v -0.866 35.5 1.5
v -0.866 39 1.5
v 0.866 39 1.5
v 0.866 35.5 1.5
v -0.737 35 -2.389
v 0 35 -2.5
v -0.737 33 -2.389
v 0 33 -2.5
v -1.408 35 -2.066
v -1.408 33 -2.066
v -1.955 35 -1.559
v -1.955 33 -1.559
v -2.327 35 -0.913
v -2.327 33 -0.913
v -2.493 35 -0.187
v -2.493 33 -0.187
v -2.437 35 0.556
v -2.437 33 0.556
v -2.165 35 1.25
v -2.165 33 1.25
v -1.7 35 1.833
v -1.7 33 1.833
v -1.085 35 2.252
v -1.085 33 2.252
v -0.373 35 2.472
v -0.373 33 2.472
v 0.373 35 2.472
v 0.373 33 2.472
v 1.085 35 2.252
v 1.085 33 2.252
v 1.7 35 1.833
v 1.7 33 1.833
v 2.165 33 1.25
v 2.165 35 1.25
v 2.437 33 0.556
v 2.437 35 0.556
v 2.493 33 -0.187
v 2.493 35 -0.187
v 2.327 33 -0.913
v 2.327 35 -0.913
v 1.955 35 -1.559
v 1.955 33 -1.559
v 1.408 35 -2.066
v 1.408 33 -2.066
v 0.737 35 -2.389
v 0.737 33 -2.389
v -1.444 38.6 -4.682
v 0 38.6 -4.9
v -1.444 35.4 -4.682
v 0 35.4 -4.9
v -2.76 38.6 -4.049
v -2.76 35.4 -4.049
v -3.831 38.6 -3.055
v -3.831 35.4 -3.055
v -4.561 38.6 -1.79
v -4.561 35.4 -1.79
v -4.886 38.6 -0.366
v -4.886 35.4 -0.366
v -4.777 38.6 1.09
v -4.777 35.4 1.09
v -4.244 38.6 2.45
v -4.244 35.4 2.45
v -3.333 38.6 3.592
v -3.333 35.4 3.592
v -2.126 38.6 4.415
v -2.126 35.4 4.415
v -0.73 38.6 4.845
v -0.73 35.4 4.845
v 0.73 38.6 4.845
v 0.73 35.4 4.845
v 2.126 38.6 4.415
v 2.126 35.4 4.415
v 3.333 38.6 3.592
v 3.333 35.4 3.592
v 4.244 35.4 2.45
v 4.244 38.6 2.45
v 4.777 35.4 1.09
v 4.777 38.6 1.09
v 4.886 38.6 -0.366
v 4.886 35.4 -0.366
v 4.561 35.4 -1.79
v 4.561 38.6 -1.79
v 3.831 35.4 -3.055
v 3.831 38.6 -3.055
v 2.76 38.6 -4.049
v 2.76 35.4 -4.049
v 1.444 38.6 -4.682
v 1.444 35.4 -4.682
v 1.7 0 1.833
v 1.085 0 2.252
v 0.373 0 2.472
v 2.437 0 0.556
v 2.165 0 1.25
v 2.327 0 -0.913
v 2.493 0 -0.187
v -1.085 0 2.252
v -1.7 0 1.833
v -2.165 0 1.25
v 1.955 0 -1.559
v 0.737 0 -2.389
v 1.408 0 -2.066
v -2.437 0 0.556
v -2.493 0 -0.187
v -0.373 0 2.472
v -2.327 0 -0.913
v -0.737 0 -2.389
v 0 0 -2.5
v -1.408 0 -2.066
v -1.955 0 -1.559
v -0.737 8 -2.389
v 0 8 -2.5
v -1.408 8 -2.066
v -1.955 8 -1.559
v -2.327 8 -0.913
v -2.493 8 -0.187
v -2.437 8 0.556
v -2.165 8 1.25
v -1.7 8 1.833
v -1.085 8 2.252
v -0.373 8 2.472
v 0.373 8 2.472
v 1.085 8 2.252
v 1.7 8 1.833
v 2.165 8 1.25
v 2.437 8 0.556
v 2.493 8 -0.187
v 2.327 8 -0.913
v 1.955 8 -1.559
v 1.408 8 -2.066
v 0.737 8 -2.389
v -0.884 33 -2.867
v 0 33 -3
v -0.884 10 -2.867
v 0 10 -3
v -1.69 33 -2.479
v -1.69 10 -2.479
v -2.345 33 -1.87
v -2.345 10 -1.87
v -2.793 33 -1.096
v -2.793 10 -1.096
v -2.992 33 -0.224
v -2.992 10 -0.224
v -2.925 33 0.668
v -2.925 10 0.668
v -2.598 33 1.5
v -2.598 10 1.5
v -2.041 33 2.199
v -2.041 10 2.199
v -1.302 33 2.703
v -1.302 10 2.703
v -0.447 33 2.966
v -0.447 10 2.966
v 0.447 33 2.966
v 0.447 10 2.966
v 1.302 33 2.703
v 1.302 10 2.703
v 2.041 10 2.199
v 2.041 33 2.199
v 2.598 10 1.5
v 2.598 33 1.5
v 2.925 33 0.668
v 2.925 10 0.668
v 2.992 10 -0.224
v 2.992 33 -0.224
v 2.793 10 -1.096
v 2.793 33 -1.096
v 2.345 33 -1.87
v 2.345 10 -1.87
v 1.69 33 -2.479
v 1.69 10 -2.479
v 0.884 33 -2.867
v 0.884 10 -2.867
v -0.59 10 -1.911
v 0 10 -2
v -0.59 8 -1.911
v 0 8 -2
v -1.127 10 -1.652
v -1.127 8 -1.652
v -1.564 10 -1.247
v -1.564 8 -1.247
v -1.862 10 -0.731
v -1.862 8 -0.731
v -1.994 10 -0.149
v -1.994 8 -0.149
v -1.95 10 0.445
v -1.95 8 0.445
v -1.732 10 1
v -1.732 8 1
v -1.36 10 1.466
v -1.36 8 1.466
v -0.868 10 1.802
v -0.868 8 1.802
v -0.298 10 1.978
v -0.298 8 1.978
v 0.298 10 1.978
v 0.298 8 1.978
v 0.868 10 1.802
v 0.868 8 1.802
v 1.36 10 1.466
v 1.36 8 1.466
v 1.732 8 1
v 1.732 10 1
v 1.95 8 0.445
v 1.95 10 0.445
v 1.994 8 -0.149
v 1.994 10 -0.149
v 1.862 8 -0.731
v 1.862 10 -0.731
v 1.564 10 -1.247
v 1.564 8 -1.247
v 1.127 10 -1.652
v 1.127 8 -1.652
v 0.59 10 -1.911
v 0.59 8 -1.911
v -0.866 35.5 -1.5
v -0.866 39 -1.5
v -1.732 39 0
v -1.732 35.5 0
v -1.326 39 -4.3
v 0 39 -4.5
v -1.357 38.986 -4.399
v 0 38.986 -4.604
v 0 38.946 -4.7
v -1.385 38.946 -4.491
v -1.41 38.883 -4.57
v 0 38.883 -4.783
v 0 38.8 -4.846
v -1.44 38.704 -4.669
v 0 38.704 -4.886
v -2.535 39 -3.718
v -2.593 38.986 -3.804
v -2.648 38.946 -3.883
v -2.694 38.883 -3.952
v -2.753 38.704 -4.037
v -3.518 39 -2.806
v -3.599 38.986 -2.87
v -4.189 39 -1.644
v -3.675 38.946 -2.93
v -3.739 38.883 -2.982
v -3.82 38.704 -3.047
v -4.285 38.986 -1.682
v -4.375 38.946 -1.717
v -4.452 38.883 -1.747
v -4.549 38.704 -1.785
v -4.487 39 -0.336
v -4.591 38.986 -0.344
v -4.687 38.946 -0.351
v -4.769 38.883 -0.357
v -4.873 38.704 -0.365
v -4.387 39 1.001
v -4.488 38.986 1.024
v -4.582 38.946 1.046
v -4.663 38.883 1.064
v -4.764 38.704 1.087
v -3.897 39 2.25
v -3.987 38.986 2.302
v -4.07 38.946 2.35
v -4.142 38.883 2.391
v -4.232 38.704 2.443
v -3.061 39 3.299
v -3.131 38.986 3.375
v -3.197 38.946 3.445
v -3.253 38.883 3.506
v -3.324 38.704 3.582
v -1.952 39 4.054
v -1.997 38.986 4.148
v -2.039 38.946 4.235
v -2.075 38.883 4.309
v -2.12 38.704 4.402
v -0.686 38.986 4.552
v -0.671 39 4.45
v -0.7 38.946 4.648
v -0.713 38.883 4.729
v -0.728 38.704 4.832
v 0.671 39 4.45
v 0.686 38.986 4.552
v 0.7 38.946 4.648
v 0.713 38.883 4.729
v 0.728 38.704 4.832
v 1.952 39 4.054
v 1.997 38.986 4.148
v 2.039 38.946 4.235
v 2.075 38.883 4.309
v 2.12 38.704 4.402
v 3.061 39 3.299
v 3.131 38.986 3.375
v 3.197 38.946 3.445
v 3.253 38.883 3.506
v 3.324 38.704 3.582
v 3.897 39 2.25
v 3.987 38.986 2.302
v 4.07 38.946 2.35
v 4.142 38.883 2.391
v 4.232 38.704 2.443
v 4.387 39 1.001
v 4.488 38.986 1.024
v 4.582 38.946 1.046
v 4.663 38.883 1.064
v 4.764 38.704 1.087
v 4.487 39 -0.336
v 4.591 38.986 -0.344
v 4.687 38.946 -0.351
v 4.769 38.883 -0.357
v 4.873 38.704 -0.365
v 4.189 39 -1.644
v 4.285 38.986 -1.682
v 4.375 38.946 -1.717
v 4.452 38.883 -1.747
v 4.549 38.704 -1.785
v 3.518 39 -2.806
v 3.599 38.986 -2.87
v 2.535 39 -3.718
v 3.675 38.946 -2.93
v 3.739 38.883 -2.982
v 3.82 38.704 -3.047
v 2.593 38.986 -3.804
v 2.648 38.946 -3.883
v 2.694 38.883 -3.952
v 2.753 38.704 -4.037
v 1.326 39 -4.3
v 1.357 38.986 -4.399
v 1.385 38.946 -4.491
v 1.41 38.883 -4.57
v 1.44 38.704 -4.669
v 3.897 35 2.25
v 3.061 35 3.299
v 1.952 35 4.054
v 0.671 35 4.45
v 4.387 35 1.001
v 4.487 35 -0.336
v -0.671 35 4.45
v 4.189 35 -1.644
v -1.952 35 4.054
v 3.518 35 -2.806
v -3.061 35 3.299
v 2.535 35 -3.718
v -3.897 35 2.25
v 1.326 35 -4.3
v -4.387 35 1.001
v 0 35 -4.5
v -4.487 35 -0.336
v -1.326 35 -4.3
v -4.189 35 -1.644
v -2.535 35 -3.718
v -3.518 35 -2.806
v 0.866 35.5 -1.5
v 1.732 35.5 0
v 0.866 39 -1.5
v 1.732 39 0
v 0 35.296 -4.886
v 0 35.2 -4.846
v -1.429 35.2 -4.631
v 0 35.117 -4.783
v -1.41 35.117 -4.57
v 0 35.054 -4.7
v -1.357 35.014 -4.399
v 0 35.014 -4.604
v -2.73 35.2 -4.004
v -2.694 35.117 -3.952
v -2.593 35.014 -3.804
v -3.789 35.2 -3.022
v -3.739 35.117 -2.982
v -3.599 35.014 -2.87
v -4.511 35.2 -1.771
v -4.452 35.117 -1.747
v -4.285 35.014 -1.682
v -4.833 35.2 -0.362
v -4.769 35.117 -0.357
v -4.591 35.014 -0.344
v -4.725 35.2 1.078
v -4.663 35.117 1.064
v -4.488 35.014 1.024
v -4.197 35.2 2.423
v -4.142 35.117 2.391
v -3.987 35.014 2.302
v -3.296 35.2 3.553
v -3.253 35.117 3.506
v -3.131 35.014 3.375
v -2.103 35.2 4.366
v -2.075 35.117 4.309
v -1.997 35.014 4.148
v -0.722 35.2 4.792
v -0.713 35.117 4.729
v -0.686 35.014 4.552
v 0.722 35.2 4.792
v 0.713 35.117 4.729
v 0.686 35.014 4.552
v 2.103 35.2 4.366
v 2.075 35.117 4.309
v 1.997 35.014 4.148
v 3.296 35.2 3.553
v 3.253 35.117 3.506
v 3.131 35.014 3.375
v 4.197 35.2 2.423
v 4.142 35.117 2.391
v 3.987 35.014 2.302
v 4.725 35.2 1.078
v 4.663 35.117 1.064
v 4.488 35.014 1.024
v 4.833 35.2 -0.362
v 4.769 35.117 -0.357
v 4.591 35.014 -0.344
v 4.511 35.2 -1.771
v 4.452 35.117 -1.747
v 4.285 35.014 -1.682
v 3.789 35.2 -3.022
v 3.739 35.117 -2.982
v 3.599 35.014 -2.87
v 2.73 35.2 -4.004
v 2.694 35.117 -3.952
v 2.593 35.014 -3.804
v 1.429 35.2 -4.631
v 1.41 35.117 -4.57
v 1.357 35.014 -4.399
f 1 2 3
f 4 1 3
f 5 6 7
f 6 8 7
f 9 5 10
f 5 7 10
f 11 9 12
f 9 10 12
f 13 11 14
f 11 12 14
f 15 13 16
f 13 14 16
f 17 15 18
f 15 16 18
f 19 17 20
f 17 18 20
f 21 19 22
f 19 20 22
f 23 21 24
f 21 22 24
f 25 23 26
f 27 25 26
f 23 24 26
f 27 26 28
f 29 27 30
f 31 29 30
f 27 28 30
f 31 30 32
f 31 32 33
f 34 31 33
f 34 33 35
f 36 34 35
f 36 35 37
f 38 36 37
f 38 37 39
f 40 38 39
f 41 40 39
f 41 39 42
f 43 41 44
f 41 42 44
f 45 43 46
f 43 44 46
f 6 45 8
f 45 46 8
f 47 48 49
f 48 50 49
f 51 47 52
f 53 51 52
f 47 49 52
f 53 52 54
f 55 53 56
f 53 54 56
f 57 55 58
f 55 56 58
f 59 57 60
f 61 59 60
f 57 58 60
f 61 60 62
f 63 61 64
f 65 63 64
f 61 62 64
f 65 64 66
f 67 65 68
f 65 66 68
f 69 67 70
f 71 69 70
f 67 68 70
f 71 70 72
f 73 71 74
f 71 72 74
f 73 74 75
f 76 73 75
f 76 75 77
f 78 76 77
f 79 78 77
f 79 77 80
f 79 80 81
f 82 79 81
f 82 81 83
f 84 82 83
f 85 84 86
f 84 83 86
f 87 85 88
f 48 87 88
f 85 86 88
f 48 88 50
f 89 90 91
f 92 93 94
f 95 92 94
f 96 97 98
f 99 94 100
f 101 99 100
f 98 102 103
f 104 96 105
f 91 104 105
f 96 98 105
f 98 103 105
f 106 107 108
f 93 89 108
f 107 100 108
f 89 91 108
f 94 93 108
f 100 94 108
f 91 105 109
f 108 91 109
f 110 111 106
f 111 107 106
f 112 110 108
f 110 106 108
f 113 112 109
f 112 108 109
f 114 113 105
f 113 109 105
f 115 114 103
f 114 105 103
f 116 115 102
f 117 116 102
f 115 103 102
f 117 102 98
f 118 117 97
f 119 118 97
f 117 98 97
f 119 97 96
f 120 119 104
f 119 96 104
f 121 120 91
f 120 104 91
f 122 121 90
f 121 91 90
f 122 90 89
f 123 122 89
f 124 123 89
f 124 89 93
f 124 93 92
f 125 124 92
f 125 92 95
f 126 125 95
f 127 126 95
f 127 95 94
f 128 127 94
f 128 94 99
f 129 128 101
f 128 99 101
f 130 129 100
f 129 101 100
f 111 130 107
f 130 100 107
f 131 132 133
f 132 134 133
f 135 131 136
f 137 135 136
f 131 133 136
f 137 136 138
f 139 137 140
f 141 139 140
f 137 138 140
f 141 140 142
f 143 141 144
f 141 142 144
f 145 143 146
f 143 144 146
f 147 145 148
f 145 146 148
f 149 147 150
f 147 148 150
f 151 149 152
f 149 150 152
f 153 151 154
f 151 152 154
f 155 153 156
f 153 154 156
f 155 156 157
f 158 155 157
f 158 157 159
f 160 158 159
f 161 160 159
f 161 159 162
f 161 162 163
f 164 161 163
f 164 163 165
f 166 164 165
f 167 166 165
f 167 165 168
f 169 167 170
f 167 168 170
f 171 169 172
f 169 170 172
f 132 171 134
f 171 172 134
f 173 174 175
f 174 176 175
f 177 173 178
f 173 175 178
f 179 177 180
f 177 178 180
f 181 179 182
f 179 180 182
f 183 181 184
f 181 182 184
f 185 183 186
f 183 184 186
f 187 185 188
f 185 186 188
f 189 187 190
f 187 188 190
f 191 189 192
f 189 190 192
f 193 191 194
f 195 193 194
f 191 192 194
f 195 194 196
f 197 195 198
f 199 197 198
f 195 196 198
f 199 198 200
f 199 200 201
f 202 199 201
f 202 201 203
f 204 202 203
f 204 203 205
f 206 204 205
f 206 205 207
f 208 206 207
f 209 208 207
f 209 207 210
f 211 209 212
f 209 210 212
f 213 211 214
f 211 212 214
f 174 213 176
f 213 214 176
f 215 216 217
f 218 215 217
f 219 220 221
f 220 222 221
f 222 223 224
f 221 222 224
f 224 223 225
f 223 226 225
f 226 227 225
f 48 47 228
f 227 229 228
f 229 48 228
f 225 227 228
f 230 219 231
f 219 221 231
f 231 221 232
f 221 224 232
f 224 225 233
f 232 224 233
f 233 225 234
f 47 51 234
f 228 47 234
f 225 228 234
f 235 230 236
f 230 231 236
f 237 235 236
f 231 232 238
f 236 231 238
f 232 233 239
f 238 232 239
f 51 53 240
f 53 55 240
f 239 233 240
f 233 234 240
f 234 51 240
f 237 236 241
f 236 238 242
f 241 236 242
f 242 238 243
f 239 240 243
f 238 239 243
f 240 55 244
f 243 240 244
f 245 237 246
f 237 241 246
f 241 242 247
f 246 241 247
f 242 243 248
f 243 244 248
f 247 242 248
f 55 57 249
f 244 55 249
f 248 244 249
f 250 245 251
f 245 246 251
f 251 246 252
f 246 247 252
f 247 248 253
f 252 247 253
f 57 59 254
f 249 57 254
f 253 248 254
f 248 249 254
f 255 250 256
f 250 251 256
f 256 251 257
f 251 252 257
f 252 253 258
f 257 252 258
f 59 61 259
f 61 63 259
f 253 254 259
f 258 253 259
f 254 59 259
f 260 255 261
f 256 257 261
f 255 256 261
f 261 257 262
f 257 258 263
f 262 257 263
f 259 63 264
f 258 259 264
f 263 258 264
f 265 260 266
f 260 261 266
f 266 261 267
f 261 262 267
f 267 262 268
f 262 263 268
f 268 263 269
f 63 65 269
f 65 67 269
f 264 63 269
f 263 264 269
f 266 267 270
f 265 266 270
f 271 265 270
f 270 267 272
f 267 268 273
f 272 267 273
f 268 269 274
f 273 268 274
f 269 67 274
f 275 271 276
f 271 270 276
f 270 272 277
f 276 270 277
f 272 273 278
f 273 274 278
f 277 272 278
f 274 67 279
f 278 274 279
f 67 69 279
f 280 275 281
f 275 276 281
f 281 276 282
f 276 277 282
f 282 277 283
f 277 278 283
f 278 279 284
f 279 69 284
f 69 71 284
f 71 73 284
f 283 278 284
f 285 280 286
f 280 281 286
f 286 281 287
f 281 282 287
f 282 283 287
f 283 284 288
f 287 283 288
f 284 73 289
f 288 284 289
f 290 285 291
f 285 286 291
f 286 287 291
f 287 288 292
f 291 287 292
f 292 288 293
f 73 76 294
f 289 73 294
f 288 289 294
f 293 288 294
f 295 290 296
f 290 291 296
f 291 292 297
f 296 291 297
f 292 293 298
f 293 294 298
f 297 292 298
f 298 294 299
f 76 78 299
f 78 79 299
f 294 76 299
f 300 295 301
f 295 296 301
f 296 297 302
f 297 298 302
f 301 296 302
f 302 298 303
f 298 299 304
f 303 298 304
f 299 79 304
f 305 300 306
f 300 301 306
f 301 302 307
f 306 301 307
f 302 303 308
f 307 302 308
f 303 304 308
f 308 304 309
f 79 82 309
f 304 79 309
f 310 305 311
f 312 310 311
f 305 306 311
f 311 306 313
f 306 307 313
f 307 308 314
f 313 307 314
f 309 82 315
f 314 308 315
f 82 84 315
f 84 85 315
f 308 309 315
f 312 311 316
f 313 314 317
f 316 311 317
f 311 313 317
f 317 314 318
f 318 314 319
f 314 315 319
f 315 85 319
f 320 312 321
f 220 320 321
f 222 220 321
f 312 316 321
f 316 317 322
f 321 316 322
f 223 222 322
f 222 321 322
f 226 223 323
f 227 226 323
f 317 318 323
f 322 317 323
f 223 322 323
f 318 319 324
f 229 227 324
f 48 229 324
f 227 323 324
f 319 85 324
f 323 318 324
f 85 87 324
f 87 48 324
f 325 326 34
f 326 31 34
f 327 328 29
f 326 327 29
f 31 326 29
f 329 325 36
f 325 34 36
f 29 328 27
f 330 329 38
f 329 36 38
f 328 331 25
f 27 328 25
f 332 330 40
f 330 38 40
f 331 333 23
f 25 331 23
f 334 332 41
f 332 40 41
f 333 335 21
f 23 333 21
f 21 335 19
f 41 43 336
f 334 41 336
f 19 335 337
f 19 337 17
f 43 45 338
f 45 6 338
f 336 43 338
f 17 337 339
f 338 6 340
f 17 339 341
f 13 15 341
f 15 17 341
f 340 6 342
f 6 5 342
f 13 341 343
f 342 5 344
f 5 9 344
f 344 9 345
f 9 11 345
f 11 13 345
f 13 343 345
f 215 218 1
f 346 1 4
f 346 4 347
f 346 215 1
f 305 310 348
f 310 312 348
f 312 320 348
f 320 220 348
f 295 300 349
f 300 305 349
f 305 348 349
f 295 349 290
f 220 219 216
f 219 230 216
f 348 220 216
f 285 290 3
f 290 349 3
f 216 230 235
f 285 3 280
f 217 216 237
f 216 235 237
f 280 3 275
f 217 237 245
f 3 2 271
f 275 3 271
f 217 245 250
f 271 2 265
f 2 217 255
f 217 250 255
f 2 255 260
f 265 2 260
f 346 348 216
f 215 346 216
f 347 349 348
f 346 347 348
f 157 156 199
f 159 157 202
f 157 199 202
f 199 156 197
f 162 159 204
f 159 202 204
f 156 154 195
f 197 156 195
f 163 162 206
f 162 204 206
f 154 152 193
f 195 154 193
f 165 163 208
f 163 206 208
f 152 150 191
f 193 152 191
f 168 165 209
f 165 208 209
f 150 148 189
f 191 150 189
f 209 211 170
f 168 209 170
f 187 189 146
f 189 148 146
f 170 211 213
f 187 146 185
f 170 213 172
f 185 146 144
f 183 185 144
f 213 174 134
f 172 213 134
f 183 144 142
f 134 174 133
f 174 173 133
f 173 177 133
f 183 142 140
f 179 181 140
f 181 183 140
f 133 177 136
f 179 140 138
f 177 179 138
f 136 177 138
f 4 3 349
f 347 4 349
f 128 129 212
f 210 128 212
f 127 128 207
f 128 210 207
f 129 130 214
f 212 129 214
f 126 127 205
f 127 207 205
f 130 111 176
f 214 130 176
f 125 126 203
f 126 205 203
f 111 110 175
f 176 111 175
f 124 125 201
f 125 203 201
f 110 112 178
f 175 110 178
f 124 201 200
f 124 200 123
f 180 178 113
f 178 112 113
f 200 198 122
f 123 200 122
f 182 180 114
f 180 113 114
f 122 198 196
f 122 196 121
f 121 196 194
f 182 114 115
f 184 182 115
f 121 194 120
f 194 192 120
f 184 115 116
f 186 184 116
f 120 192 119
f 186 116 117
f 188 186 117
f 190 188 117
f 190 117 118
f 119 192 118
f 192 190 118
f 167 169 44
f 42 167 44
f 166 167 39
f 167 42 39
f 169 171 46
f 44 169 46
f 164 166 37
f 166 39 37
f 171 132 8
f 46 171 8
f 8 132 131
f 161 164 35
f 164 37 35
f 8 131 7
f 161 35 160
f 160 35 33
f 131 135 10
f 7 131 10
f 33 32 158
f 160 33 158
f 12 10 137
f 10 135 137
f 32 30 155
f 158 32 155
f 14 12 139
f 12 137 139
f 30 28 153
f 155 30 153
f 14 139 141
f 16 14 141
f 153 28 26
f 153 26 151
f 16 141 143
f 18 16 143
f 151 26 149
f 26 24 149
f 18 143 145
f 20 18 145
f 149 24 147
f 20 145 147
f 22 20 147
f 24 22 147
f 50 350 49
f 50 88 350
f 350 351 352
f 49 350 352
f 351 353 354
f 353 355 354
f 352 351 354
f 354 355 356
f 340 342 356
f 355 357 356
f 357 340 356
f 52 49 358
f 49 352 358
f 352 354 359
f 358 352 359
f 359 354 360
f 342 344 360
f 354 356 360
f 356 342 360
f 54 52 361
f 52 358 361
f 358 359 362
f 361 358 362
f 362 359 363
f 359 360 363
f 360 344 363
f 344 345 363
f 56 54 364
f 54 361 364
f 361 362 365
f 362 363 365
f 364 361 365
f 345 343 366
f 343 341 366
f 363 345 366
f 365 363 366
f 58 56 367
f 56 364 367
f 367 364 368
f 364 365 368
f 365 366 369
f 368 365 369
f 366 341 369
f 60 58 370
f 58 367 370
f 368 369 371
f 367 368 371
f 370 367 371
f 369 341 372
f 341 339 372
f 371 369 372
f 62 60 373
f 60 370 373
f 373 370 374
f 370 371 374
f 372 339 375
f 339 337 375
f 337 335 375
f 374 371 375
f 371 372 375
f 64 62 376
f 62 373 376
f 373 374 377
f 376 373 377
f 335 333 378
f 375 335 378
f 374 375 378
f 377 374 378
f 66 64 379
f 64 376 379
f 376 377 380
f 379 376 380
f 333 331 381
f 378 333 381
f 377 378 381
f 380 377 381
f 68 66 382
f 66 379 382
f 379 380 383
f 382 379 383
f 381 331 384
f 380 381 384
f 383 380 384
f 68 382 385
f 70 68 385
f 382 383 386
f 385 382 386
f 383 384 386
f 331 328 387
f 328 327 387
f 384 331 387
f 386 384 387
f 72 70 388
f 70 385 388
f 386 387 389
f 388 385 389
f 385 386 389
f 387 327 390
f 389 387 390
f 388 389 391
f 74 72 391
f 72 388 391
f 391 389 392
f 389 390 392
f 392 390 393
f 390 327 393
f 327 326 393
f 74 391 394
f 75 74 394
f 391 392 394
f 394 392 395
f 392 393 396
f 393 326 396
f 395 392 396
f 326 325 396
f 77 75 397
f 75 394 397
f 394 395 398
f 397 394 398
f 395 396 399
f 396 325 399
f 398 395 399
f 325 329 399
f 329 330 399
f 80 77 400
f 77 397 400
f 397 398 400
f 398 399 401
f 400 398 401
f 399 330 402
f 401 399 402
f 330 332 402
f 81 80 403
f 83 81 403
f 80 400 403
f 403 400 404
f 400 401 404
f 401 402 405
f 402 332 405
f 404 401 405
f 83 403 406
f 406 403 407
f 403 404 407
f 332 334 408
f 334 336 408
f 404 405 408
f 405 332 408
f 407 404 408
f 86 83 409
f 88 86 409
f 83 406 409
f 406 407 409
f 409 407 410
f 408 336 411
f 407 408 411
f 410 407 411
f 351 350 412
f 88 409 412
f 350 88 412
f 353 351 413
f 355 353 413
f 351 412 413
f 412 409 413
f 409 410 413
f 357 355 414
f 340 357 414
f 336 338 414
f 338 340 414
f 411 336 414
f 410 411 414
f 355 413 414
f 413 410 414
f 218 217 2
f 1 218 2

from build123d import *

# Parameters (mm, degrees)
CUT_EXTRUDE_1_DEPTH = 3.5


with BuildPart() as part:
    # 草图1 → 旋转1 (revolve)
    with BuildSketch(Plane.XY, mode=Mode.PRIVATE) as revolve_1_sk:
        with BuildLine():
            Line((0, 39), (-4.5, 39))
            ThreePointArc((-4.5, 39), (-4.782842712, 38.882842712), (-4.9, 38.6))
            Line((-4.9, 38.6), (-4.9, 35.4))
            ThreePointArc((-4.9, 35.4), (-4.782842712, 35.117157288), (-4.5, 35))
            Line((-4.5, 35), (-2.5, 35))
            Line((-2.5, 35), (-2.5, 33))
            Line((-2.5, 33), (-3, 33))
            Line((-3, 33), (-3, 10))
            Line((-3, 10), (-2, 10))
            Line((-2, 10), (-2, 8))
            Line((-2, 8), (-2.5, 8))
            Line((-2.5, 8), (-2.5, 0))
            Line((-2.5, 0), (0, 0))
            Line((0, 0), (0, 39))
        make_face()
    revolve(revolve_1_sk.sketch.rotate(Axis((0, 0, 0), (0, 1, 0)), 270), axis=Axis((0, 0, 0), (0, 1, 0)))

    # 草图2 → 切除-拉伸1 (cut)
    with BuildSketch(Plane(origin=(0, 39, 0), x_dir=(1, 0, 0), z_dir=(0, 1, 0))):
        Polygon((0.866025404, 1.5), (-0.866025404, 1.5), (-1.732050808, 0), (-0.866025404, -1.5), (0.866025404, -1.5), (1.732050808, 0), align=None)
    extrude(amount=-CUT_EXTRUDE_1_DEPTH, mode=Mode.SUBTRACT)


solid = part.part
